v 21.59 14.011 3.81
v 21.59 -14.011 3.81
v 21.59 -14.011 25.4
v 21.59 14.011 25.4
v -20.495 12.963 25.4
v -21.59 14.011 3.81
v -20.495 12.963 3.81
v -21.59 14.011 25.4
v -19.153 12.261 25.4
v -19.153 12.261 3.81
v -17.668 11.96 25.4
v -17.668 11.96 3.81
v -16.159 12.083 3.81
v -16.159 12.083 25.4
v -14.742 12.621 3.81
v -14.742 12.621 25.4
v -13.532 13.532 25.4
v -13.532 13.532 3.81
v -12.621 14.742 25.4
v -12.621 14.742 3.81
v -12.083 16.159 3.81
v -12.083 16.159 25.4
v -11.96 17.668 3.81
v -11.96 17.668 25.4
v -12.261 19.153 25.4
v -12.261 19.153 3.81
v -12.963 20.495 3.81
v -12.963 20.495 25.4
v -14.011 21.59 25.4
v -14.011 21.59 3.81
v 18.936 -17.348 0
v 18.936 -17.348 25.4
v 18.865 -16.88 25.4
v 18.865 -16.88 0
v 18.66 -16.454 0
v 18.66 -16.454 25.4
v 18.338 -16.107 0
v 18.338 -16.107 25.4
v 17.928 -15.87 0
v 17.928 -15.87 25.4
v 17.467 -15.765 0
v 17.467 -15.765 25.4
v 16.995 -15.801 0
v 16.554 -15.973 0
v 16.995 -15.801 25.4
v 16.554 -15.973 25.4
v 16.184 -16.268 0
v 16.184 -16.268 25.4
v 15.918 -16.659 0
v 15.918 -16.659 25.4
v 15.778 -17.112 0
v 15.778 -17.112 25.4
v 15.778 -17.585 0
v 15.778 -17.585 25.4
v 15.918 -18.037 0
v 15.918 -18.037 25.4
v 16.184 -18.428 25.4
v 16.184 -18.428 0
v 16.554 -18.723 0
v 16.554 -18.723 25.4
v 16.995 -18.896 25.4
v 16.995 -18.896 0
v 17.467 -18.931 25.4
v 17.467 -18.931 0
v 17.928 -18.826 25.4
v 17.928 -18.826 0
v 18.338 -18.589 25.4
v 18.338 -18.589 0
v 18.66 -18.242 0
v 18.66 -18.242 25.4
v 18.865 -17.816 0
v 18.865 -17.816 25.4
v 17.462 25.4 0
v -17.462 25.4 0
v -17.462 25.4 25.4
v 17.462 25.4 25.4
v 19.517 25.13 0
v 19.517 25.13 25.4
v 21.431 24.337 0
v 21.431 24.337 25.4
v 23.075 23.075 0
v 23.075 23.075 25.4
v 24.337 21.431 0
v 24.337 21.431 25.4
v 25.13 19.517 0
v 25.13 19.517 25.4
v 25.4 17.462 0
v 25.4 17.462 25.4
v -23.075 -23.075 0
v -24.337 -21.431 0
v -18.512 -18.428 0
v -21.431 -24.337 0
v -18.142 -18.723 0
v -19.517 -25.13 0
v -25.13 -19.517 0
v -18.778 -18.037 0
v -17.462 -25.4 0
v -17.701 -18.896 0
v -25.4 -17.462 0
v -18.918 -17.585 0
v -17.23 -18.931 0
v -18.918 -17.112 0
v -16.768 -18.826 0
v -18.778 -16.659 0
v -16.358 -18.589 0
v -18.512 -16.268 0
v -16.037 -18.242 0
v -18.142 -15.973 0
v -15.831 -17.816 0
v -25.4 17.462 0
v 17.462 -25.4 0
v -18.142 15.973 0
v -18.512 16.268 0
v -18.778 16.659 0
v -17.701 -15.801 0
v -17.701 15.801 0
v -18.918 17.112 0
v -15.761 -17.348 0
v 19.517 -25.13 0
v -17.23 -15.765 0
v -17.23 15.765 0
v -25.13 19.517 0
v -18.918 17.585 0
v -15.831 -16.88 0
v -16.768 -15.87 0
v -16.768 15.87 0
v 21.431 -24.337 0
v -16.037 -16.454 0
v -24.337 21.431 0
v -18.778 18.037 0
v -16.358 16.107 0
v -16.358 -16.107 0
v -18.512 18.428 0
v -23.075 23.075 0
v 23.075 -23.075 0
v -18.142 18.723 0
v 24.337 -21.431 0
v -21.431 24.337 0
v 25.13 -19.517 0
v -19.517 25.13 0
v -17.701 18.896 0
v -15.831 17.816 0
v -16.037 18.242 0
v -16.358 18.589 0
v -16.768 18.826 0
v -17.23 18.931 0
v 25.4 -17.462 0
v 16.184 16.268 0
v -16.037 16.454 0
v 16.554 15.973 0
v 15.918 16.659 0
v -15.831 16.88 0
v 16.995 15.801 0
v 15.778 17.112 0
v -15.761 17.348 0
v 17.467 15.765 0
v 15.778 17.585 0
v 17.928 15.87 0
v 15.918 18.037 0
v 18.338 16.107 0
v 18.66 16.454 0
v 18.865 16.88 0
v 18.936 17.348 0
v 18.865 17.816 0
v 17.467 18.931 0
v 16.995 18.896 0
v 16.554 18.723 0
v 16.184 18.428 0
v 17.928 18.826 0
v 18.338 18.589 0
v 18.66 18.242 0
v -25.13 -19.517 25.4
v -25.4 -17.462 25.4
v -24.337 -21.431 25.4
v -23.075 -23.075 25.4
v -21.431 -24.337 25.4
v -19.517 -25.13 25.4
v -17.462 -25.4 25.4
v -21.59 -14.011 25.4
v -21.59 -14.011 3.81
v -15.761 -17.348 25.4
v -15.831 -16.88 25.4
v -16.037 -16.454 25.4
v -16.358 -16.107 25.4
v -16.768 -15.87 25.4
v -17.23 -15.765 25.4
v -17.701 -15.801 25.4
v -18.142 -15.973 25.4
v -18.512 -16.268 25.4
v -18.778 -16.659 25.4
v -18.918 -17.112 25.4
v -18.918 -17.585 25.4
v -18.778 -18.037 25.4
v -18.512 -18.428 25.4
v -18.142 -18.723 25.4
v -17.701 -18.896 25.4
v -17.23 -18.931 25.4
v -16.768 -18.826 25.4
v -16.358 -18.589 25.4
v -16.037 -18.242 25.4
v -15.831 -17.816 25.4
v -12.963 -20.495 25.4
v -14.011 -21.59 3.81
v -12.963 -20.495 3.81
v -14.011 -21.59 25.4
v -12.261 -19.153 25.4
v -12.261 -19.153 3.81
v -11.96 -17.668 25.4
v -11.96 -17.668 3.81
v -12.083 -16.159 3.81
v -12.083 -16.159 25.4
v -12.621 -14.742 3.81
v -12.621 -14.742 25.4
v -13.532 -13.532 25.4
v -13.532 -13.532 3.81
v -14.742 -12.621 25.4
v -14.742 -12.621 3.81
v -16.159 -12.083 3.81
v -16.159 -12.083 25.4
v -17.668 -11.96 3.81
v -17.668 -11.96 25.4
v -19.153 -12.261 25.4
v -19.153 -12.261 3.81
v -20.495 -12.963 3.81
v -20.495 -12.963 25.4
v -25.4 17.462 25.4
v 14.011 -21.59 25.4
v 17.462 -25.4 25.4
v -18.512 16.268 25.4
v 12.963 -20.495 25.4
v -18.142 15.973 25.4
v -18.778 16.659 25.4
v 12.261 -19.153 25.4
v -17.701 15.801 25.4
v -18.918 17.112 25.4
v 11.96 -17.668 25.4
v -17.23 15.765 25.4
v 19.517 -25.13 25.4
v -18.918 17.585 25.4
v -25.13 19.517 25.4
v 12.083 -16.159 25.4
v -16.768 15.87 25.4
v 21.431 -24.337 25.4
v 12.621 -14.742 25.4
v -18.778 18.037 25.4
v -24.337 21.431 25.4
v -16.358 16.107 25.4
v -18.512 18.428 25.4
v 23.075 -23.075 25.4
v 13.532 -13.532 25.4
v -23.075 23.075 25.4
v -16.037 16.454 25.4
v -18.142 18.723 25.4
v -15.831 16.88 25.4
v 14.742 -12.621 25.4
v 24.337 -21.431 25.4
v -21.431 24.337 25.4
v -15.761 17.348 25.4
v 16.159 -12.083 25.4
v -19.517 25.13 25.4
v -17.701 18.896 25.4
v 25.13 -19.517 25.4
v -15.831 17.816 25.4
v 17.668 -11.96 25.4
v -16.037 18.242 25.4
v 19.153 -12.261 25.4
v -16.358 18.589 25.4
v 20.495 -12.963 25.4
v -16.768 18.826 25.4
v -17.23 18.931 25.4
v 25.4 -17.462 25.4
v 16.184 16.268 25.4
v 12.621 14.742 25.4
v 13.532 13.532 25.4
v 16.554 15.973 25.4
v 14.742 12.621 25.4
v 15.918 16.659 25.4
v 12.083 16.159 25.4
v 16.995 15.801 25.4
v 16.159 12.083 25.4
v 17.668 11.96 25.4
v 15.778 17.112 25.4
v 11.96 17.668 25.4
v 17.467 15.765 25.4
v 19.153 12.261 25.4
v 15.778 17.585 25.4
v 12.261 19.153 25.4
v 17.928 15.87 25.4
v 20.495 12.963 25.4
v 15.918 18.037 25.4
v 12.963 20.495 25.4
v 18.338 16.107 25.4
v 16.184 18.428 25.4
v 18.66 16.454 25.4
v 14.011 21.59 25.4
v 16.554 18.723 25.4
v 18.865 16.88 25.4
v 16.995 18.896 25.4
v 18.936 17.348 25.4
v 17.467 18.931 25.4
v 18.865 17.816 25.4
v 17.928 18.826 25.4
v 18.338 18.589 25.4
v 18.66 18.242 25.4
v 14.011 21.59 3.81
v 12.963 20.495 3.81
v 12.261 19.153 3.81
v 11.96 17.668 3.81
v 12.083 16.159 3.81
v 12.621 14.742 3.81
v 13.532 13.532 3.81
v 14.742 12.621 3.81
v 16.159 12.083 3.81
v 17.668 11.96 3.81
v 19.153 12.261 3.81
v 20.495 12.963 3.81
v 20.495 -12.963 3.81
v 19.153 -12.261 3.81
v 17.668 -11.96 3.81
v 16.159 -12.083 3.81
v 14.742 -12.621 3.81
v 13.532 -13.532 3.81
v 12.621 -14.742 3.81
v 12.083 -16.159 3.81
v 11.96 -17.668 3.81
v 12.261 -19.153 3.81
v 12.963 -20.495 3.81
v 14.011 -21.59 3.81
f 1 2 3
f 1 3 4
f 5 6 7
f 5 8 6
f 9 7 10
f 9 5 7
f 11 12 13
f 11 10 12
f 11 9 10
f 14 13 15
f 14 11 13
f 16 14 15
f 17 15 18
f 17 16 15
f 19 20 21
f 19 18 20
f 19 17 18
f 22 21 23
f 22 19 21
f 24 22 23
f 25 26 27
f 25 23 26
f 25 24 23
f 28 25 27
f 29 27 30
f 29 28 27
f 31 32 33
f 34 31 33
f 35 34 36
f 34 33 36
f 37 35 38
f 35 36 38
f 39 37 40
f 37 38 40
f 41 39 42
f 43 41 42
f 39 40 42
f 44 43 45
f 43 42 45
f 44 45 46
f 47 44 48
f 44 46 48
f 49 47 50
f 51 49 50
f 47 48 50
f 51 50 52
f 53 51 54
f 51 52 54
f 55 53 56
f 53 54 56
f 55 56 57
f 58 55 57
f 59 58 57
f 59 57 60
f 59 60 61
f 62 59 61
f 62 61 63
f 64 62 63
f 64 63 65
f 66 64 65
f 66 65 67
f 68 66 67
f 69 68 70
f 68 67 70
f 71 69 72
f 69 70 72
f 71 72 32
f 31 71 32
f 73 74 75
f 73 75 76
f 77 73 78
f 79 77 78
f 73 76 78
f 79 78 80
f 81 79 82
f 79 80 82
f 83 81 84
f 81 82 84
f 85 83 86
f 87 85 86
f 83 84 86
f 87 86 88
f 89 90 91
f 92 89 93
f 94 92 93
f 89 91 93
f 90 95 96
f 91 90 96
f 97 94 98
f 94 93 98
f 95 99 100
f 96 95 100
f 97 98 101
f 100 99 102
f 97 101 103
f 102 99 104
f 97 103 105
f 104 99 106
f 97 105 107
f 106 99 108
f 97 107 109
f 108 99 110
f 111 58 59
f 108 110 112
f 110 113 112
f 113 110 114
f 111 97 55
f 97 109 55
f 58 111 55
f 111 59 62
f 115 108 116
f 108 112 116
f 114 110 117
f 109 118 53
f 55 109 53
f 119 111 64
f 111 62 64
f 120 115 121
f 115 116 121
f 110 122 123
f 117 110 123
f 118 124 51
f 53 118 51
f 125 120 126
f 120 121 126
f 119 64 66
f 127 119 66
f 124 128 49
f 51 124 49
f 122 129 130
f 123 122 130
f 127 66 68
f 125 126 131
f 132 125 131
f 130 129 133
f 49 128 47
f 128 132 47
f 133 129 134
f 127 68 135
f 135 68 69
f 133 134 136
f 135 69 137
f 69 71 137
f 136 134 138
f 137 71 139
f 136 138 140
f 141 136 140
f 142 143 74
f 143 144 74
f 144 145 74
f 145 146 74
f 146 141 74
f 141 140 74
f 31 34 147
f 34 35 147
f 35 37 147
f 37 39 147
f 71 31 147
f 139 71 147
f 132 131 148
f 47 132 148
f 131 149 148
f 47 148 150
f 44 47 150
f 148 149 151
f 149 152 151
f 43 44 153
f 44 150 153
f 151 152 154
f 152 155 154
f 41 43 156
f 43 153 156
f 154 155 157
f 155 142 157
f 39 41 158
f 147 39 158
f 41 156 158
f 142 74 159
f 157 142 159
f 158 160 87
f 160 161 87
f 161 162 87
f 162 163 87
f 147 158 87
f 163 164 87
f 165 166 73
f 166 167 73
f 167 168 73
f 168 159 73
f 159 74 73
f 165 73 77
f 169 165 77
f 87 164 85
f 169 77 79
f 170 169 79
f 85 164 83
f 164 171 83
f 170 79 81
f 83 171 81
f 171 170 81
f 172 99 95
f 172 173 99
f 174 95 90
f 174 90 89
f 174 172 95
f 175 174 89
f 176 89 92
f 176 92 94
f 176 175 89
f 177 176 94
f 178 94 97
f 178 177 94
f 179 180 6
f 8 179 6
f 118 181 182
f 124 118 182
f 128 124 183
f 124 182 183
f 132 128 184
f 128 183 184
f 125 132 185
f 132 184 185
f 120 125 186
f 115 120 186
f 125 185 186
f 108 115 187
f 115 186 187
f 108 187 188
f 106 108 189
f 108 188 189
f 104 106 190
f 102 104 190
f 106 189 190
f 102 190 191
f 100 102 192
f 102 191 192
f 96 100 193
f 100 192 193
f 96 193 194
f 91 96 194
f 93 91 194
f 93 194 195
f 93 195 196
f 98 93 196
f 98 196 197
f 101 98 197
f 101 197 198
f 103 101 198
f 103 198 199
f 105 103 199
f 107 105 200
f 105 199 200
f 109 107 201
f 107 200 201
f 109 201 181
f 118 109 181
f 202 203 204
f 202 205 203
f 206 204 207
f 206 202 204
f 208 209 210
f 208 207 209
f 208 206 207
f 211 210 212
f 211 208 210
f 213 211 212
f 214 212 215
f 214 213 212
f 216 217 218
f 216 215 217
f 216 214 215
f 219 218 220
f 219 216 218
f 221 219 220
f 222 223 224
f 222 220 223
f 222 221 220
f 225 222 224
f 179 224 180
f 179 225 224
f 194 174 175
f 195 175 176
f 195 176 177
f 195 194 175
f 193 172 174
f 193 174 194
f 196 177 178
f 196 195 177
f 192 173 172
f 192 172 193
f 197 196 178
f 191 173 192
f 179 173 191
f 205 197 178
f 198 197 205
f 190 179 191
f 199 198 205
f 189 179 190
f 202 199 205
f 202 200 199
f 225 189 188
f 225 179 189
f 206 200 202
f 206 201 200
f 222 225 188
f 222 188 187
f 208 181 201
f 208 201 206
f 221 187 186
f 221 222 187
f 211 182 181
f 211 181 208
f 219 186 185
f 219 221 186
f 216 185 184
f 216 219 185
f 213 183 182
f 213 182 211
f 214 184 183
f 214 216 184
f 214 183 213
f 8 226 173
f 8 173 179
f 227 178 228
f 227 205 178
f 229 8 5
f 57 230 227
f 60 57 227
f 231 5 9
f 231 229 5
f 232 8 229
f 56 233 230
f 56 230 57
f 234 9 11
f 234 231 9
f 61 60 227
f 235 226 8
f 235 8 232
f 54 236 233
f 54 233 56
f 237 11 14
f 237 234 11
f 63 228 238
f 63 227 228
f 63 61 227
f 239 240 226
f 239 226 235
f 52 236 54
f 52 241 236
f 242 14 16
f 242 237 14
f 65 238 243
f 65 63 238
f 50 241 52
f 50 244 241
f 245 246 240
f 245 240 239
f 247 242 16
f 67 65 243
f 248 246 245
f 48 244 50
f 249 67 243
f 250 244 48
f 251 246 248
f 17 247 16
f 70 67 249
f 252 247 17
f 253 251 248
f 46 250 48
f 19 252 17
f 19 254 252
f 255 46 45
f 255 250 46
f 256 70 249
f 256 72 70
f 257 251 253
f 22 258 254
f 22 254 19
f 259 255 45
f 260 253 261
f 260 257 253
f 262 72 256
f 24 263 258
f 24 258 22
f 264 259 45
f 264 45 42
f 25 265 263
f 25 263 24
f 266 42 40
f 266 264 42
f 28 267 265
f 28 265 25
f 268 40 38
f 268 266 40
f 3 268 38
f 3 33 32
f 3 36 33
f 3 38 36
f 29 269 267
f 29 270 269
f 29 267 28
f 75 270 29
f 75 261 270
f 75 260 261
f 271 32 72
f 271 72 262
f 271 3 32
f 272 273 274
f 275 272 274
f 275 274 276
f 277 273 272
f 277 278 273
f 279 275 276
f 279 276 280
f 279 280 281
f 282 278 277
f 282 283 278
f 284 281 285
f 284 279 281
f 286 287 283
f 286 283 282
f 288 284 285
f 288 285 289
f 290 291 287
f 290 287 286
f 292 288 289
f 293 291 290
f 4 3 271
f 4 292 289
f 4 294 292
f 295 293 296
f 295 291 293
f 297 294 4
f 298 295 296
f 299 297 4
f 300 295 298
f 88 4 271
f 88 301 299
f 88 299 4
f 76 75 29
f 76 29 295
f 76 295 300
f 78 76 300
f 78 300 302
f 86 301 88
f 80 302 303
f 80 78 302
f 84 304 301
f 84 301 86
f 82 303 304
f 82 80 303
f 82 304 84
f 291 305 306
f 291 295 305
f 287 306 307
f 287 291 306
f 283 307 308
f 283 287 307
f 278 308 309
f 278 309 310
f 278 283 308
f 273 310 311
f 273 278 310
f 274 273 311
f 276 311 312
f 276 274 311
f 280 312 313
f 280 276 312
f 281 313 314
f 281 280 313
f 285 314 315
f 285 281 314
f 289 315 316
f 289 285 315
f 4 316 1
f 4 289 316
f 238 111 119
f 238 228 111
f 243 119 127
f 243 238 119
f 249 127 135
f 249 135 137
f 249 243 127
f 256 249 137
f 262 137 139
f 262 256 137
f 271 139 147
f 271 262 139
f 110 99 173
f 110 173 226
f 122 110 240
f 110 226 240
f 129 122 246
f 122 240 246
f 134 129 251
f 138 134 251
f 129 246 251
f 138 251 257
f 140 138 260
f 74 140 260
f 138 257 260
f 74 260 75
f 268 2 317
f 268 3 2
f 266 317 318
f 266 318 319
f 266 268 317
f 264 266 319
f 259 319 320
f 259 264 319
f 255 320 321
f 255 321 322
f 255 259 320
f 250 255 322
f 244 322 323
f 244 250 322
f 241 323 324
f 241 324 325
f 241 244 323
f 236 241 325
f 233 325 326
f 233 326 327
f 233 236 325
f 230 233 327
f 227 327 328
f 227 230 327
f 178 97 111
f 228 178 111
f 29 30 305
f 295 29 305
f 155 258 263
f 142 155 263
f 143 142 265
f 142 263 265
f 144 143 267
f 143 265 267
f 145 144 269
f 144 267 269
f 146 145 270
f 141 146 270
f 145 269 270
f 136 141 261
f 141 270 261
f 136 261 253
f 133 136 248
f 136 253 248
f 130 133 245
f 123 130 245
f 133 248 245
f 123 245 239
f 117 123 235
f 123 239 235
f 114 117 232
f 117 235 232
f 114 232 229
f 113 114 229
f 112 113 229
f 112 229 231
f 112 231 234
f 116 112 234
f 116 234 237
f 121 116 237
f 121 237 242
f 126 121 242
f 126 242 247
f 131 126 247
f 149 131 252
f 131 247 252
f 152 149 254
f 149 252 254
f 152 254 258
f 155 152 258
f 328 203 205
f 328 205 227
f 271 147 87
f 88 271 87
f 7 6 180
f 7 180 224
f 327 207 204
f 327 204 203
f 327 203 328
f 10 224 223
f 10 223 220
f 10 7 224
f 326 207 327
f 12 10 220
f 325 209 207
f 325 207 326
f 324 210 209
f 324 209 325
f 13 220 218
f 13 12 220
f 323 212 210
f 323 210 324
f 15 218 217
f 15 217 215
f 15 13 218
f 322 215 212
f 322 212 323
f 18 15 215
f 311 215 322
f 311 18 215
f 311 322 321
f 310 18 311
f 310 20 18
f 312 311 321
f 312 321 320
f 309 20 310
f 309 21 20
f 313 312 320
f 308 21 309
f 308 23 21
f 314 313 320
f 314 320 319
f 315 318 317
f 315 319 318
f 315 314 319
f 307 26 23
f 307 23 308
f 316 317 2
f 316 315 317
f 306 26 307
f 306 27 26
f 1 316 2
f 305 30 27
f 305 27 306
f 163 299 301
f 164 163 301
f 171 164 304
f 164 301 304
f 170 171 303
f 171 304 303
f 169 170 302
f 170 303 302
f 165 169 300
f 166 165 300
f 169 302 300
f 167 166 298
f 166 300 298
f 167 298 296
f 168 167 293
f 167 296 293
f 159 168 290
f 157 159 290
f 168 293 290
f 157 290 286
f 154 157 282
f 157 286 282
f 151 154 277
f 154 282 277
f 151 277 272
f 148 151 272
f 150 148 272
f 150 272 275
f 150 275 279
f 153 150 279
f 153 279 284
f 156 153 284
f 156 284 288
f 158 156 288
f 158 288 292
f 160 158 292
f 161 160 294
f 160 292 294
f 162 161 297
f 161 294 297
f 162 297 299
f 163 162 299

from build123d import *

# Parameters (mm, degrees)
F0_W     = 50.8
F0_H     = 50.8
F1_DEPTH = 25.4
F2_R     = 1.5875
F3_DEPTH = 25.4
F4_R     = 7.9375
F5_T     = -3.81


with BuildPart() as f1:
    # F0 (on Top) → F1 (new body)
    with BuildSketch(Plane.XY):
        Rectangle(F0_W, F0_H)
    extrude(amount=F1_DEPTH)

    # F2 (on face) → F3 (cut, through all)
    with BuildSketch(Plane.XY.offset(25.4)):
        with Locations((17.3482, 17.3482)):
            Circle(F2_R)
        with Locations((17.3482, -17.3482)):
            Circle(F2_R)
        with Locations((-17.3482, 17.3482)):
            Circle(F2_R)
        with Locations((-17.3482, -17.3482)):
            Circle(F2_R)
    extrude(amount=-F3_DEPTH, mode=Mode.SUBTRACT)

    # F4
    f4_edges = [f1.edges().sort_by_distance(p)[0] for p in [
        (25.4, -25.4, 12.7),
        (25.4, 25.4, 12.7),
        (-25.4, -25.4, 12.7),
        (-25.4, 25.4, 12.7),
    ]]
    fillet(f4_edges, radius=F4_R)

    # F5
    f5_openings = [f1.faces().sort_by_distance(p)[0] for p in [
        (0, 0, 25.4),
    ]]
    offset(amount=F5_T, openings=f5_openings, kind=Kind.INTERSECTION)


solid = f1.part
